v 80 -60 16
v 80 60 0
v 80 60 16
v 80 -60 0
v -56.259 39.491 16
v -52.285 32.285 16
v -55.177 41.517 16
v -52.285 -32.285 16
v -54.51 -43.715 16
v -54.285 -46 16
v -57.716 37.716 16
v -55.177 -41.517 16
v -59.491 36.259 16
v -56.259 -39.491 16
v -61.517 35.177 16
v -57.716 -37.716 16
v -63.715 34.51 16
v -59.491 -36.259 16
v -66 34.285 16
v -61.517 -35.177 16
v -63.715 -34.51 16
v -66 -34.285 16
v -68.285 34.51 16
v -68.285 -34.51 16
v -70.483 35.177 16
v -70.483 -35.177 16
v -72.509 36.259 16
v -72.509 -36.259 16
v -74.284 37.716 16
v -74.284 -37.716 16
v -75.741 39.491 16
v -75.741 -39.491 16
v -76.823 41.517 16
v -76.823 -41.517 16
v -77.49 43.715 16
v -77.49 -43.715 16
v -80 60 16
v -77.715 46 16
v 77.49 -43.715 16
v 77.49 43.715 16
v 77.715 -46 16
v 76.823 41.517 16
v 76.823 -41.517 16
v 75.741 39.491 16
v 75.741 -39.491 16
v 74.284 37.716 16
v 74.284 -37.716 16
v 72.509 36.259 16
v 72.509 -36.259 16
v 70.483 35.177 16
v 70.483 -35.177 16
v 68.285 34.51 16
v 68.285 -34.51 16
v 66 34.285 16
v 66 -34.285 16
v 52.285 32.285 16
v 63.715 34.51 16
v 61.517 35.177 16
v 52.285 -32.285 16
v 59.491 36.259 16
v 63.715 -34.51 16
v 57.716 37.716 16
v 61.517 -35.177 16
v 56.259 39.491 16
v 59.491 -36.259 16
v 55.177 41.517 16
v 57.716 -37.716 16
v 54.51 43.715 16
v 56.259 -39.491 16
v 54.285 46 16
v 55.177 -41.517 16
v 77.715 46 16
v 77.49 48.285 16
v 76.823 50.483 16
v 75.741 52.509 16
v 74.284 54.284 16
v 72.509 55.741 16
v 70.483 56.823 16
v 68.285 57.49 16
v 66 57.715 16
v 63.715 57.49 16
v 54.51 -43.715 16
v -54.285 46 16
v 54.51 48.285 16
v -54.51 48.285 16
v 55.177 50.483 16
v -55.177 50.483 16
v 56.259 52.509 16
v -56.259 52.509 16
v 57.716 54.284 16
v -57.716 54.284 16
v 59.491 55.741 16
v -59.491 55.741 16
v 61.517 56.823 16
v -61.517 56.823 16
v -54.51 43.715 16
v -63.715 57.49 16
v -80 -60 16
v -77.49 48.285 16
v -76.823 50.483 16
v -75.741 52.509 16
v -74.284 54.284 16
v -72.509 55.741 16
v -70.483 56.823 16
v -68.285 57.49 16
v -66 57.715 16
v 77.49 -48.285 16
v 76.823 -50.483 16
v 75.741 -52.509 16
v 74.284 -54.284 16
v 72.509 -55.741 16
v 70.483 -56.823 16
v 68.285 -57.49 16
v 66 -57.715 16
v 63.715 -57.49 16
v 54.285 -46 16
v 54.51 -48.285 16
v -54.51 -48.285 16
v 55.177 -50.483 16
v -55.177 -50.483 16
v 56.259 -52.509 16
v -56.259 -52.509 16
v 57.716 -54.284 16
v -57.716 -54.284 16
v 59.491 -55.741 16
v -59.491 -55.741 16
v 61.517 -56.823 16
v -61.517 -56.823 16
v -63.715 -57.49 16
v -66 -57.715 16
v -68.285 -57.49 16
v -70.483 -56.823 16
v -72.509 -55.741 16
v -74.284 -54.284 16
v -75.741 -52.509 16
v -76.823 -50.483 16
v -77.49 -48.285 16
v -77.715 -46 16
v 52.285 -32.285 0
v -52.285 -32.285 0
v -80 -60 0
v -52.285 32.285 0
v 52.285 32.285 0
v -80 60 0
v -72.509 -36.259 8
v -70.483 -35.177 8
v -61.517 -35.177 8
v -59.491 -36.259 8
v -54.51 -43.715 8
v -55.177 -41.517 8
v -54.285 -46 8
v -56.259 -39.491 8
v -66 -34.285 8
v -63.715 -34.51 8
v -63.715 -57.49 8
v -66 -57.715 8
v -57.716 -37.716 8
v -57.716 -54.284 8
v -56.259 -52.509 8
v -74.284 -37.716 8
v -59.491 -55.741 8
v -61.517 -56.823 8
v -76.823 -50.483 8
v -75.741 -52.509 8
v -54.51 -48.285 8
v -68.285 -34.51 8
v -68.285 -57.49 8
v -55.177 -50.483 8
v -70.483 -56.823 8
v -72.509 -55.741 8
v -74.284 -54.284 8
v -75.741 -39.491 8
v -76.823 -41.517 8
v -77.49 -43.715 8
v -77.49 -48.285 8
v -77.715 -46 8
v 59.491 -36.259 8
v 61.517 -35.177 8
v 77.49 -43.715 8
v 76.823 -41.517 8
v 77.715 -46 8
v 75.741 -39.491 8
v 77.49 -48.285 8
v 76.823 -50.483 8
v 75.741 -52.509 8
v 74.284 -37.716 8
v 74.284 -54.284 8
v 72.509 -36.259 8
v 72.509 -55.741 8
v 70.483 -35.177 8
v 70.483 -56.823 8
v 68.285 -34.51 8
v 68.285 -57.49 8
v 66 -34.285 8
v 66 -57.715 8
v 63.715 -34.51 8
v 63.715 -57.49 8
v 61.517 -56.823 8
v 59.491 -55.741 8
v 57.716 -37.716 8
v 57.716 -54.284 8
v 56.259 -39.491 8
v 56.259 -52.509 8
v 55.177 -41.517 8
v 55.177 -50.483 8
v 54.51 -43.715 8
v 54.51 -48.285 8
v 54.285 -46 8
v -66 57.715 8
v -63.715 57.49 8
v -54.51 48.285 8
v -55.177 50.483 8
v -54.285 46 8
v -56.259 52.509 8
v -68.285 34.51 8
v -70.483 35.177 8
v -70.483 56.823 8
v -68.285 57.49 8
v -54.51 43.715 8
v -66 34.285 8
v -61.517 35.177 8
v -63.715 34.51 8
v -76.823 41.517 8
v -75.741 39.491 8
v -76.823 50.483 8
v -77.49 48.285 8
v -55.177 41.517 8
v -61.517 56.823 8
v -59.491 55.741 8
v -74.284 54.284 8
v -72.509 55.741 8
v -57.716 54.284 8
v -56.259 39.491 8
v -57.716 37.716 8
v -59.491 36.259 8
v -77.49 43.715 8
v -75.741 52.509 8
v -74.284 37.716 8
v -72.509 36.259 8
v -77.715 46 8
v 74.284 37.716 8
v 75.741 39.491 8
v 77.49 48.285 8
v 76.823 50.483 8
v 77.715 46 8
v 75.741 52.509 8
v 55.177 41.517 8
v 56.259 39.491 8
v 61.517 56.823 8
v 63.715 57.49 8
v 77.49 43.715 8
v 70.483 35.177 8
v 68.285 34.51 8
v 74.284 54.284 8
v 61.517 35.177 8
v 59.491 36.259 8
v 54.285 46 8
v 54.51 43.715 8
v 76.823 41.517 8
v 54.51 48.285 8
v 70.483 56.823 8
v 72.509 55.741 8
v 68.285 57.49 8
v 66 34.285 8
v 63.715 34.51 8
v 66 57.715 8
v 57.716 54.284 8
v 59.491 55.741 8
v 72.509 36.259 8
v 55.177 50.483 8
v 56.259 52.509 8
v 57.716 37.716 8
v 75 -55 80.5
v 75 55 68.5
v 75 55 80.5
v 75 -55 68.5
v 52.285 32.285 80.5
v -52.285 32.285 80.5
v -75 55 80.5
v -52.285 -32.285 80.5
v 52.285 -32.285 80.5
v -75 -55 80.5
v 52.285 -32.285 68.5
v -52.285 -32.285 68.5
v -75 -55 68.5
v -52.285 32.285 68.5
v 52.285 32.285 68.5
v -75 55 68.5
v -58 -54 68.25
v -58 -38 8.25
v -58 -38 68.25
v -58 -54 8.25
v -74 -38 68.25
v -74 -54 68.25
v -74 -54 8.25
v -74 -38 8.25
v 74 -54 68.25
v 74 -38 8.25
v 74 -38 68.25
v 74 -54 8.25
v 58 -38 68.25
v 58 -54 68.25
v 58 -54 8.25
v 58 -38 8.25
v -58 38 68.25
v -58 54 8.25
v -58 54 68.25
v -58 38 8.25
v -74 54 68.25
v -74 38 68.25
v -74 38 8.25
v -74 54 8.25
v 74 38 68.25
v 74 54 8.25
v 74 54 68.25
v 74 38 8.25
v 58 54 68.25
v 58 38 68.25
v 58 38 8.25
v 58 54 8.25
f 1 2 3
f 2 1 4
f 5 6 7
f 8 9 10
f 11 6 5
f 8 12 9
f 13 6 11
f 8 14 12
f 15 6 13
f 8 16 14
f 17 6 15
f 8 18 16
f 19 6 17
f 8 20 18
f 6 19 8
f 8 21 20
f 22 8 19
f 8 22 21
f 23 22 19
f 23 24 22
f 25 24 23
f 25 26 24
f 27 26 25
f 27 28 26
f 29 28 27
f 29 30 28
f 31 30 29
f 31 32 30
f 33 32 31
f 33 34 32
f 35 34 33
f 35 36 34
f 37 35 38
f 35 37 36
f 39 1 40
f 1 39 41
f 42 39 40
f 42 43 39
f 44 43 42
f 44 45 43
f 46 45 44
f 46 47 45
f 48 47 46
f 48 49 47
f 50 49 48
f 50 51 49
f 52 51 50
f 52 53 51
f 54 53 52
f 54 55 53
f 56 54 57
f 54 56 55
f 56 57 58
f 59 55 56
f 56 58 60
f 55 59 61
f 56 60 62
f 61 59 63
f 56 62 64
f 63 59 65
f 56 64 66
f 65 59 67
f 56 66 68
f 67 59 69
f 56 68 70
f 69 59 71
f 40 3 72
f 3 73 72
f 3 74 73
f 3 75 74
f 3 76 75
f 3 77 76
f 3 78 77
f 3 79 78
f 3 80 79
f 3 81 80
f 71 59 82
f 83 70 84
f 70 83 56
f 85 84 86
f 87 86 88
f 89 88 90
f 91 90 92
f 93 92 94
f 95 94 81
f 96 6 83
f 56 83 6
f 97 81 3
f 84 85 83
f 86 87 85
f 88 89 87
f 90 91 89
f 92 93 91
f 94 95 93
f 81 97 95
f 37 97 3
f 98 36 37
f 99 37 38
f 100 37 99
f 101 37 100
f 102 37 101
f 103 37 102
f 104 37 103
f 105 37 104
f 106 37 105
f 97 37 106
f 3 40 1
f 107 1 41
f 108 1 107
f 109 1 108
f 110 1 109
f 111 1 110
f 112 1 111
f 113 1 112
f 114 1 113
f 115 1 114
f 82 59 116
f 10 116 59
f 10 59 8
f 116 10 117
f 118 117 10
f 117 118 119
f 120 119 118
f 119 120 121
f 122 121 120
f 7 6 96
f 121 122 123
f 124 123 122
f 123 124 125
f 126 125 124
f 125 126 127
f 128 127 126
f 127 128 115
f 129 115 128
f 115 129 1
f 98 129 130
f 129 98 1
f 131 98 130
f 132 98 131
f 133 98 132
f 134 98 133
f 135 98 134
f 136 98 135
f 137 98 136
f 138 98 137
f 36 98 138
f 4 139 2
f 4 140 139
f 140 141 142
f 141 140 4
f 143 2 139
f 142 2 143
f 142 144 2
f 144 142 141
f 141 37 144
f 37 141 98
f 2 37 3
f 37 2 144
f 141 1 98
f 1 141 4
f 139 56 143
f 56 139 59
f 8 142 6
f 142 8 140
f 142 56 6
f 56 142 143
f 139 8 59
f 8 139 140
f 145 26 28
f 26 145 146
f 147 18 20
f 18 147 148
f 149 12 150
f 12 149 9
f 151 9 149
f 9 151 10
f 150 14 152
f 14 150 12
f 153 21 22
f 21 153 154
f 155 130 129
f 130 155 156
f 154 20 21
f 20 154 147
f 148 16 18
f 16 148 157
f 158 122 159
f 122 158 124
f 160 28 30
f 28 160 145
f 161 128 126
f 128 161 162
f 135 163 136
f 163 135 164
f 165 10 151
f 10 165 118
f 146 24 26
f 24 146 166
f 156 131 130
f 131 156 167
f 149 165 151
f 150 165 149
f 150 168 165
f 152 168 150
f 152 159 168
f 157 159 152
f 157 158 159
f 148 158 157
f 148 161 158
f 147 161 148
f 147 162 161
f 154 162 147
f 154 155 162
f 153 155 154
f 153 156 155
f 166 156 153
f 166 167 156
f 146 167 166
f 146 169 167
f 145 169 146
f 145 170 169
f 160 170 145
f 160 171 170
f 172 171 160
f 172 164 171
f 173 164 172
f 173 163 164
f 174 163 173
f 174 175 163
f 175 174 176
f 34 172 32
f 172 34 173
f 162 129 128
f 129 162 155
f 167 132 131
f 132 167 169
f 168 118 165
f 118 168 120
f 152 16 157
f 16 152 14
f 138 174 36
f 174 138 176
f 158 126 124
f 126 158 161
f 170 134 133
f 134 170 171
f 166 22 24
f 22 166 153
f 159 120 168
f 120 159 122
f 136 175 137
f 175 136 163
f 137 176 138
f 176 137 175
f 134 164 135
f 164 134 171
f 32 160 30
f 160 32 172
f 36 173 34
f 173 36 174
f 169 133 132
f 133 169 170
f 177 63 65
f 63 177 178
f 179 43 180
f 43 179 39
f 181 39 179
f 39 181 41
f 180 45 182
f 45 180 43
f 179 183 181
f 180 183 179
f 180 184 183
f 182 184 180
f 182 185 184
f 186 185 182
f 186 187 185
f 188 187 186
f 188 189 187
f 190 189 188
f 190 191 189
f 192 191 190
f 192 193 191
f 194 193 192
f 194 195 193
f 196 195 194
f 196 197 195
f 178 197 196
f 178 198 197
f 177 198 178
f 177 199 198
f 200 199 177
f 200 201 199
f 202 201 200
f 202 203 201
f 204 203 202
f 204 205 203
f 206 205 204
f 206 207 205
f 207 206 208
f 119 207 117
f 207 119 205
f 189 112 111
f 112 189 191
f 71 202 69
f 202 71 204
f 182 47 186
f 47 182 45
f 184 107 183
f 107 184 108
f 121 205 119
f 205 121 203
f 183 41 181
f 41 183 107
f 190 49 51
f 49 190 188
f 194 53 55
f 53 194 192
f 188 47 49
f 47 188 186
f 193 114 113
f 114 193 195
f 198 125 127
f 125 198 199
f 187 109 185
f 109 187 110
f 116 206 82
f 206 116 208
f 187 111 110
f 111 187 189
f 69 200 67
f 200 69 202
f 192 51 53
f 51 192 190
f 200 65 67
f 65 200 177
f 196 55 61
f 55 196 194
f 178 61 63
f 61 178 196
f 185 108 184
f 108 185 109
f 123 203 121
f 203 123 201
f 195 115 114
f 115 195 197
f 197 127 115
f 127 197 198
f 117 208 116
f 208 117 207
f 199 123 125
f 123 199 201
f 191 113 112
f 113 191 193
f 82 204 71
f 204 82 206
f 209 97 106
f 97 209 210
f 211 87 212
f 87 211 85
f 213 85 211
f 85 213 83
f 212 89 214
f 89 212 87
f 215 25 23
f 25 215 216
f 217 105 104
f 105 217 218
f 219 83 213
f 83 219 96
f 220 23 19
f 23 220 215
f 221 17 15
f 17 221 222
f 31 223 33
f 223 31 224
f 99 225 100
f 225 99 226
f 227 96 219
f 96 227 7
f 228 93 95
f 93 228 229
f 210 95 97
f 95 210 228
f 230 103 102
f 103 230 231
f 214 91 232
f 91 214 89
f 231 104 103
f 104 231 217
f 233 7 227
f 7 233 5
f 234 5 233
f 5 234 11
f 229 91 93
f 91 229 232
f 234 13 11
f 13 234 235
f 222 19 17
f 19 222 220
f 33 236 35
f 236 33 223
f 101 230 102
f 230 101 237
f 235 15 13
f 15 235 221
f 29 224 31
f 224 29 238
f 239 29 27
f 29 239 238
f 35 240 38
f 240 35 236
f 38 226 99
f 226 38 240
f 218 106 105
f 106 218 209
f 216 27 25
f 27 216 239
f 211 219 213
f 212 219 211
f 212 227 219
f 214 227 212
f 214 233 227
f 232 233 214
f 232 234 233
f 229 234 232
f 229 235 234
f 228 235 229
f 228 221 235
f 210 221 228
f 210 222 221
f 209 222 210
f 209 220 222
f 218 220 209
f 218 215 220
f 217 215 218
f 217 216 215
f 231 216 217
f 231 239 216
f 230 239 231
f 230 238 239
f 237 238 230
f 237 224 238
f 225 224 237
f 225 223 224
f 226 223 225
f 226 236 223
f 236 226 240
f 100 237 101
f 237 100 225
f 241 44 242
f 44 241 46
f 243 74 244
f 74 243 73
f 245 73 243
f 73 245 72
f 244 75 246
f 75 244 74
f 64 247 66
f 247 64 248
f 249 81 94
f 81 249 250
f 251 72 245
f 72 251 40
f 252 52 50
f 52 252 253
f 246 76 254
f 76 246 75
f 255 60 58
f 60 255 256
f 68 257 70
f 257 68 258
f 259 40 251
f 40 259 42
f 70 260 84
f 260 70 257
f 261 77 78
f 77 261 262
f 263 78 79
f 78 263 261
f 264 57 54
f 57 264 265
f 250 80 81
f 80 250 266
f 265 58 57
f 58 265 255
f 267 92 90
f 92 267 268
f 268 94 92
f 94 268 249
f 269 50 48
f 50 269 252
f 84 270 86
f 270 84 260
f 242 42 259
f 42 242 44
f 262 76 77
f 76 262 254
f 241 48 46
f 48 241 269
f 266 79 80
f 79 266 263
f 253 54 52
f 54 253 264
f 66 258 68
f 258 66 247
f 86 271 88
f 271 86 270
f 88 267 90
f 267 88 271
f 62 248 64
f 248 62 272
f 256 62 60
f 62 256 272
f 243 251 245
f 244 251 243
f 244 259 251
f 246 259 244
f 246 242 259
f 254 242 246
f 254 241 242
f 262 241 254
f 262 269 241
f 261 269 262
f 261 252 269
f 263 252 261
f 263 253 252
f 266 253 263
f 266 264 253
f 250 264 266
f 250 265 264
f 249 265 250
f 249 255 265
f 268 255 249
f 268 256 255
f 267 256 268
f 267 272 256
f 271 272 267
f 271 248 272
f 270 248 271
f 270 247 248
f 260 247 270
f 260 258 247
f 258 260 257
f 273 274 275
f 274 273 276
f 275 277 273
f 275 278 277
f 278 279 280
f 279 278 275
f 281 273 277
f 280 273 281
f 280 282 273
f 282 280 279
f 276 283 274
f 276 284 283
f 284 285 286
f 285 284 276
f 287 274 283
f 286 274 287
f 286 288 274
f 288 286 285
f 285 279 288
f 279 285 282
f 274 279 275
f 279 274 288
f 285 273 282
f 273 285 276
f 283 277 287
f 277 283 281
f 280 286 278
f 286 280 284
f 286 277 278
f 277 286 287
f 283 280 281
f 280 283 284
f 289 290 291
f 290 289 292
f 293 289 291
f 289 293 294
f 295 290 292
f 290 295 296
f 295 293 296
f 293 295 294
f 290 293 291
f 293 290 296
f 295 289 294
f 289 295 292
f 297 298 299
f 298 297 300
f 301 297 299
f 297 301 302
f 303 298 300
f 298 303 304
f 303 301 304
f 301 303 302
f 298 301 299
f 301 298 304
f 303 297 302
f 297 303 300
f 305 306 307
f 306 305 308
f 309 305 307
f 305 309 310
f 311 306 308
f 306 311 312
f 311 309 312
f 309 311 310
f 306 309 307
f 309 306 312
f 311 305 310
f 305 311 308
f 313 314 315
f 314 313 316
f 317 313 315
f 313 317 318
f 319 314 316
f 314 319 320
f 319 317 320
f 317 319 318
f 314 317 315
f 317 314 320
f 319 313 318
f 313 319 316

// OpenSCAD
$fn = 32;

// ------------------------------------------------------------------------
// Frame cube: base 160 x 120 mm, posts 60 mm tall
// Every part is its own module, assembly() places every instance.
// ------------------------------------------------------------------------

// --- part 1 ---
module base_frame() {
  difference() {
    translate([-80, -60, 0]) cube([160, 120, 16]);
    translate([-52.285, -32.285, -1]) cube([104.57, 64.57, 18]);
    translate([-66, -46, 8]) cylinder(h = 9, d = 23.43);
    translate([66, -46, 8]) cylinder(h = 9, d = 23.43);
    translate([-66, 46, 8]) cylinder(h = 9, d = 23.43);
    translate([66, 46, 8]) cylinder(h = 9, d = 23.43);
  }
}

// --- part 2 ---
module corner_post() {
  translate([-8, -8, 0]) cube([16, 16, 60]);
}

// --- part 3 ---
module top_frame() {
  difference() {
    translate([-75, -55, 0]) cube([150, 110, 12]);
    translate([-52.285, -32.285, -1]) cube([104.57, 64.57, 14]);
  }
}

// --- assembly ---
module assembly() {
  color([0.80, 0.24, 0.20]) translate([0, 0, 0]) rotate([0, 0, 0]) base_frame();
  color([0.20, 0.45, 0.75]) translate([-66, -46, 8.25]) rotate([0, 0, 0]) corner_post();
  color([0.25, 0.62, 0.32]) translate([66, -46, 8.25]) rotate([0, 0, 0]) corner_post();
  color([0.92, 0.70, 0.18]) translate([-66, 46, 8.25]) rotate([0, 0, 0]) corner_post();
  color([0.58, 0.35, 0.70]) translate([66, 46, 8.25]) rotate([0, 0, 0]) corner_post();
  color([0.16, 0.66, 0.66]) translate([0, 0, 68.5]) rotate([0, 0, 0]) top_frame();
}

assembly();
